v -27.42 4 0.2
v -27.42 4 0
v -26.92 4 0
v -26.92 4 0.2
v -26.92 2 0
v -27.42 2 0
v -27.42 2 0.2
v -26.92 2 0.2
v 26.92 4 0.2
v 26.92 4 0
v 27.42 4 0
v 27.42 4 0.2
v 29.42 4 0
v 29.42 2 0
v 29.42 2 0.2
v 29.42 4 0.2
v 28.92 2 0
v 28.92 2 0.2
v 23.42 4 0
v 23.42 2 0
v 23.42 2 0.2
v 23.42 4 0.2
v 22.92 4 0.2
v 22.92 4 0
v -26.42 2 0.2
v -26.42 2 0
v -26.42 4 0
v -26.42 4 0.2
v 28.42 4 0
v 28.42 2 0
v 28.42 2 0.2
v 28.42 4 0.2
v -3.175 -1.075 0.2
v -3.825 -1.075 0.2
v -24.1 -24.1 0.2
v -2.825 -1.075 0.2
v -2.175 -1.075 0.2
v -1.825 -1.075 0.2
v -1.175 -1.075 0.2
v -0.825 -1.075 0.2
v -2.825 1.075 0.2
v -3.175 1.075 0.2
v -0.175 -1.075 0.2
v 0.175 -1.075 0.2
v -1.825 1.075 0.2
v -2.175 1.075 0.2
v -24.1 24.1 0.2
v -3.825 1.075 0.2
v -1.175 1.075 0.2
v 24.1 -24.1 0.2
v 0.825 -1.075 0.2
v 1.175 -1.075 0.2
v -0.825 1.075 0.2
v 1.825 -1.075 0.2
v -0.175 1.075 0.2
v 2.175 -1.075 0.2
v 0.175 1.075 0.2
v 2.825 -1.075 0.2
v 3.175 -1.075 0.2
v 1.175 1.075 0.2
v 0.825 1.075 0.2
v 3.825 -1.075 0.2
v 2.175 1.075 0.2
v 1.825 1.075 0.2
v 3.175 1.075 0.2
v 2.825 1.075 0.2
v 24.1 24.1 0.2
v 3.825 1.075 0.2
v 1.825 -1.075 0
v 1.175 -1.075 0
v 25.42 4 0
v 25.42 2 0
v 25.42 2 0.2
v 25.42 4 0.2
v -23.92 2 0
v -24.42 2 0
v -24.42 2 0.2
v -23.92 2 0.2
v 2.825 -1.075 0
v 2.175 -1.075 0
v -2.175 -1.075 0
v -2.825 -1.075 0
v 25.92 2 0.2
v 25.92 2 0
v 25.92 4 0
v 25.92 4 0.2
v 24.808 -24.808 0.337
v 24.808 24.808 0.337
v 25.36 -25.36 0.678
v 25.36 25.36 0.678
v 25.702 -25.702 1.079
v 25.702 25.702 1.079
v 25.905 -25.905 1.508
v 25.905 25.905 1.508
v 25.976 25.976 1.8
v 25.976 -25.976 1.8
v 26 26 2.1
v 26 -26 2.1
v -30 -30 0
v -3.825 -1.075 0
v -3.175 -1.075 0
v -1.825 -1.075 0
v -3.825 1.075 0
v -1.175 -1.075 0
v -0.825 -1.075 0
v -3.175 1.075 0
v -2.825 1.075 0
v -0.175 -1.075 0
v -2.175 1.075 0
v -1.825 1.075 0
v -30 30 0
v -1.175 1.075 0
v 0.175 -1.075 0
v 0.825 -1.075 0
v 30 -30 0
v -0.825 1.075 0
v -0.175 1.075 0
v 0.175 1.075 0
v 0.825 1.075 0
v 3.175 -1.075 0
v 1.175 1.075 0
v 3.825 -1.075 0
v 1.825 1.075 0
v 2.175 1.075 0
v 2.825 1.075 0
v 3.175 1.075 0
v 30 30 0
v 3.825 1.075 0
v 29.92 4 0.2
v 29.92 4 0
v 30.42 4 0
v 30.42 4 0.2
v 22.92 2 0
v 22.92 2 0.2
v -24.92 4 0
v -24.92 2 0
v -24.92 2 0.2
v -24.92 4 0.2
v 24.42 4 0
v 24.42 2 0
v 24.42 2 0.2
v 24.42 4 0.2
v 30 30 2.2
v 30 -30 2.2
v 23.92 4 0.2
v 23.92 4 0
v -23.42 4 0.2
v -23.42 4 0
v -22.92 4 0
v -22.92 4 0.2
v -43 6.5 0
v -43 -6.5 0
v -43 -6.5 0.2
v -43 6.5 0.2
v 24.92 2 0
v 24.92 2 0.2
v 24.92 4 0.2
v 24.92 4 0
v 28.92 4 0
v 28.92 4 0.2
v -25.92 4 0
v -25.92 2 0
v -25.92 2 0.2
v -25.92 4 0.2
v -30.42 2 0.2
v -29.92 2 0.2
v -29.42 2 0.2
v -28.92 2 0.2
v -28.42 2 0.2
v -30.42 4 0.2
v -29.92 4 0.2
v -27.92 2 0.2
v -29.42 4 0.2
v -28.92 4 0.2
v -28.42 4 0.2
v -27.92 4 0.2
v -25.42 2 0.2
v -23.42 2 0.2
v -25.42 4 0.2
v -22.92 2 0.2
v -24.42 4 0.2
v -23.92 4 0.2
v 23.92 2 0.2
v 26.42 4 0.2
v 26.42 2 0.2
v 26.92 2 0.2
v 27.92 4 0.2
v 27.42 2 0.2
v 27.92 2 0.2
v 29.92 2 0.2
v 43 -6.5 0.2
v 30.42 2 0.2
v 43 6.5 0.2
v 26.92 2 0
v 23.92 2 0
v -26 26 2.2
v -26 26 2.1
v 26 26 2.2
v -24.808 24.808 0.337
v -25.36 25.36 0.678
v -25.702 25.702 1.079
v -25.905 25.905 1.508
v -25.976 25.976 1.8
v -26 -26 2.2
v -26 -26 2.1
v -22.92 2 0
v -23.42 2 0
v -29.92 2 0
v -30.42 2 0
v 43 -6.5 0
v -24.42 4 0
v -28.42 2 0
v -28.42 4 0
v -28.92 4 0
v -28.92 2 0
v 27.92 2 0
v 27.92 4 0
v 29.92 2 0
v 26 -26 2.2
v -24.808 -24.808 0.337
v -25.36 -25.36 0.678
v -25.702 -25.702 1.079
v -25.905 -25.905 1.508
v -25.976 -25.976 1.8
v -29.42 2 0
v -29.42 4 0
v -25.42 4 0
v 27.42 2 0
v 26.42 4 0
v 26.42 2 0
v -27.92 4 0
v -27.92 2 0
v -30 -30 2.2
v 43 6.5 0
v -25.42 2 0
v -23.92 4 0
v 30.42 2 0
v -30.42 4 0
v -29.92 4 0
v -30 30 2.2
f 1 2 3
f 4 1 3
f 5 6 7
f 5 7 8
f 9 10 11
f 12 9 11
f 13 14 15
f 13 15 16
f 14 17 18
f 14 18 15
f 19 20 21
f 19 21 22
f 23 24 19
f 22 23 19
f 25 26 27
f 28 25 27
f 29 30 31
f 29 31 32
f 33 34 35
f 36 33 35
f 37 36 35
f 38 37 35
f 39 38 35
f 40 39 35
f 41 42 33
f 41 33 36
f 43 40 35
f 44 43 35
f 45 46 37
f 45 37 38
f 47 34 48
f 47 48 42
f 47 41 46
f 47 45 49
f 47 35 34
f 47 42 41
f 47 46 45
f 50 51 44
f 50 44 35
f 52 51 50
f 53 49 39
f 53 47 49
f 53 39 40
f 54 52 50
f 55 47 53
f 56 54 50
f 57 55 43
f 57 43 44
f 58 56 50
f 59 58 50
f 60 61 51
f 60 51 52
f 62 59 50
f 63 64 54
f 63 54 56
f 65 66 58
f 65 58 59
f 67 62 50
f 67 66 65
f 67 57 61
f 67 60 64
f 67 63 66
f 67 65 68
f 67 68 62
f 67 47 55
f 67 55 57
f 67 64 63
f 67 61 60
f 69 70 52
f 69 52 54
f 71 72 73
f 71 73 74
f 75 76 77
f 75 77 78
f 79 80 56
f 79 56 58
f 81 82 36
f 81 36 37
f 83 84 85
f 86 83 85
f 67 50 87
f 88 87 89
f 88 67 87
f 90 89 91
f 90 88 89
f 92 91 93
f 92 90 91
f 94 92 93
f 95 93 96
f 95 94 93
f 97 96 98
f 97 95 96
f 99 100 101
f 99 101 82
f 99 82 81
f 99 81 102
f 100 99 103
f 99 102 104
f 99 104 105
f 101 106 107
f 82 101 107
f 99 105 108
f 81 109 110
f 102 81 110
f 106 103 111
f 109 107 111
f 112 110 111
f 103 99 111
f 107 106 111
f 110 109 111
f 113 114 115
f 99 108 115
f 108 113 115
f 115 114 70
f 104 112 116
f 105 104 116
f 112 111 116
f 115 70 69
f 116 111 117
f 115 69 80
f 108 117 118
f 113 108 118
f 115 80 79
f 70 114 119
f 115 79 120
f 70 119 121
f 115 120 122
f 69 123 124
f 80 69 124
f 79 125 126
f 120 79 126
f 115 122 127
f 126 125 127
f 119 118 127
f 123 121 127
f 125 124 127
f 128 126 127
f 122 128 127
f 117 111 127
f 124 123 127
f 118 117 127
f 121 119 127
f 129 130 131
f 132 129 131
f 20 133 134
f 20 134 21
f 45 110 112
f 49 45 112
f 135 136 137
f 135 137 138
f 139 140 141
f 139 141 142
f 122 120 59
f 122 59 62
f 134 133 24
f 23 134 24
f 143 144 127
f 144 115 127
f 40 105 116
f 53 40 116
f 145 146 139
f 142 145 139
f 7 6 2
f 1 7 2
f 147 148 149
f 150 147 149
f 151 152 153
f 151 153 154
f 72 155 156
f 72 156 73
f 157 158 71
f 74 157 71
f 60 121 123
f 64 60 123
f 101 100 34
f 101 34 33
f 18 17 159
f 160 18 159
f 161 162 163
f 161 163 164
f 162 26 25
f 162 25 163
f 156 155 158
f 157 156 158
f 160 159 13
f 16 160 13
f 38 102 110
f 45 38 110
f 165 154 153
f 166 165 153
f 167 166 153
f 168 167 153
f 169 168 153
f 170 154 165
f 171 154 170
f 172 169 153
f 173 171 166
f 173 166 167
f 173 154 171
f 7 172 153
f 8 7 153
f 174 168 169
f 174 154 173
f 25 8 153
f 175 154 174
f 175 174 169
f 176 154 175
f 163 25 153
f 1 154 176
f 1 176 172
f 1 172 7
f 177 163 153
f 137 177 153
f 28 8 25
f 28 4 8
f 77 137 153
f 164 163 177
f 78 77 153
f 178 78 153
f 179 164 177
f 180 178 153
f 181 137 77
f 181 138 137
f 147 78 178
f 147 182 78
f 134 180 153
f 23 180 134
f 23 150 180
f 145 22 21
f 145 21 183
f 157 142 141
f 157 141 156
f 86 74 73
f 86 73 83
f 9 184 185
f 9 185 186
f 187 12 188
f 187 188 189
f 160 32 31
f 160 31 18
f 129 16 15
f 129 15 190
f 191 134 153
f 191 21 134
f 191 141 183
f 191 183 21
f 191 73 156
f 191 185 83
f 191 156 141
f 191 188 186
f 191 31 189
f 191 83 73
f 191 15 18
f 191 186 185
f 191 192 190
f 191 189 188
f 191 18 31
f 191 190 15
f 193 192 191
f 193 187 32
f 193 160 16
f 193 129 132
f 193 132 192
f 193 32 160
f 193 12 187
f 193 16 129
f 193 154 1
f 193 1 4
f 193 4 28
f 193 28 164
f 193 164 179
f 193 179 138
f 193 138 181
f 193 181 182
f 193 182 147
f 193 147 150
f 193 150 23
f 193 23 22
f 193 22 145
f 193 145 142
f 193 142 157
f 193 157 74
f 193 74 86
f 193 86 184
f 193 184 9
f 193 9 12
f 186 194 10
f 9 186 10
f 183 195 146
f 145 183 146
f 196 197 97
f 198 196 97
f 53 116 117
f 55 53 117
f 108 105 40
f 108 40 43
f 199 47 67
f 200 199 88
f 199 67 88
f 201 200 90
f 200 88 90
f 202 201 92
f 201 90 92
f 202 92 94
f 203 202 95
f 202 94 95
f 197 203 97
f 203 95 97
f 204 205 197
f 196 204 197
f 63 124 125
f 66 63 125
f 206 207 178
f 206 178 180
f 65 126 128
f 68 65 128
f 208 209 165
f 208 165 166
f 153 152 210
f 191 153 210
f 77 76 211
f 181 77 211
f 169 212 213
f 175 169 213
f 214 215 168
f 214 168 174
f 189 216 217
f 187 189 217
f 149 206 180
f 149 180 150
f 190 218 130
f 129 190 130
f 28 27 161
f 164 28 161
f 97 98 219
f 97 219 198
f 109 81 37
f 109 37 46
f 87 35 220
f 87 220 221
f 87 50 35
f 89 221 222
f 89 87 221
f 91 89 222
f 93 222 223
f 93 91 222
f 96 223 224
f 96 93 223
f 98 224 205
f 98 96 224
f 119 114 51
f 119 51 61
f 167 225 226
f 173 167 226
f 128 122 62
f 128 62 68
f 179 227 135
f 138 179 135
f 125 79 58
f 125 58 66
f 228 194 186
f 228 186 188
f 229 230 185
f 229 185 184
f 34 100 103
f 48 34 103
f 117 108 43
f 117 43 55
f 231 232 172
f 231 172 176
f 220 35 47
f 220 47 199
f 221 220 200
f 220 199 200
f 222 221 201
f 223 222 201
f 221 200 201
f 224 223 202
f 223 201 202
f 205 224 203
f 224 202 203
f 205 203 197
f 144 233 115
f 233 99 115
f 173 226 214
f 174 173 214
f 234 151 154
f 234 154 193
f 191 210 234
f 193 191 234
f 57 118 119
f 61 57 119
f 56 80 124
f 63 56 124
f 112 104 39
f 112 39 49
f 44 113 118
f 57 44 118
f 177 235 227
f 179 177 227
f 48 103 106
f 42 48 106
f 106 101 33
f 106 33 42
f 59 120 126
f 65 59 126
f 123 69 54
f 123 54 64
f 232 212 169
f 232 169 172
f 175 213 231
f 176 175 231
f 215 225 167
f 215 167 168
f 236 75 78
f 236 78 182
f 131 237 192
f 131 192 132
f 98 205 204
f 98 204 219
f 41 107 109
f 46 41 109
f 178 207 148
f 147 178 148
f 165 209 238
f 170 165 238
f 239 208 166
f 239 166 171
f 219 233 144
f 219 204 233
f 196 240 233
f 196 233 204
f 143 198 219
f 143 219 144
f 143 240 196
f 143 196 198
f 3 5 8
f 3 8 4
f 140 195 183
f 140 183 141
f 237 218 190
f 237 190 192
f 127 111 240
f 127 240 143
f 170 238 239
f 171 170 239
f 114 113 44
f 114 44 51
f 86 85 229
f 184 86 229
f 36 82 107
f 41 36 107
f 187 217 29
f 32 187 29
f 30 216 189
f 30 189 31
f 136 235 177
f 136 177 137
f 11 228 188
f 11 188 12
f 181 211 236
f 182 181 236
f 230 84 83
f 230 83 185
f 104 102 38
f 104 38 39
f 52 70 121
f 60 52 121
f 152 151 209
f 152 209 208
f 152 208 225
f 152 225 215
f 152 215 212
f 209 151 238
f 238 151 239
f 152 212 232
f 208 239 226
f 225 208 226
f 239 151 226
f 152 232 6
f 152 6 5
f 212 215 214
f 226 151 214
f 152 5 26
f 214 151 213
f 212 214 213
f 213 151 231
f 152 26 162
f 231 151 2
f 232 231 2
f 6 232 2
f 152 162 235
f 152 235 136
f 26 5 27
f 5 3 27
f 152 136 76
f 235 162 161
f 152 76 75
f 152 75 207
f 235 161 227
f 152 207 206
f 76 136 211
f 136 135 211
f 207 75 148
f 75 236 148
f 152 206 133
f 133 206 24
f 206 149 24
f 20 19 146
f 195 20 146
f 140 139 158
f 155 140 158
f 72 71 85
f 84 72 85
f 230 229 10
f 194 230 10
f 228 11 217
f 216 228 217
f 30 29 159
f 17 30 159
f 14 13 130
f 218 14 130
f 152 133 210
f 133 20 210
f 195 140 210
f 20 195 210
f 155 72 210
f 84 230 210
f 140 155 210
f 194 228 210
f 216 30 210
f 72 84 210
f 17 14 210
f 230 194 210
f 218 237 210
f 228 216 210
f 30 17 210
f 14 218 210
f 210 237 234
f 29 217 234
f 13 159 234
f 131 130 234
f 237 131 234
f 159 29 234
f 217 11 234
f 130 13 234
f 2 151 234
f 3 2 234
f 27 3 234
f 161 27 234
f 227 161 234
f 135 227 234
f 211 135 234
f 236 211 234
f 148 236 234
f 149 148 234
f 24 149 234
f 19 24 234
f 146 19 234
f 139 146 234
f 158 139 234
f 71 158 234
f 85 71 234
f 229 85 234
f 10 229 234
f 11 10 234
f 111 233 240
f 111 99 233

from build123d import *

# Parameters (mm, degrees)
SKETCH_W      = 86
SKETCH_H      = 13
SKETCH_W_2    = 0.5
SKETCH_H_2    = 2
PAD_DEPTH     = 0.2
SKETCH001_W   = 60
SKETCH001_H   = 60
SKETCH001_W_2 = 0.65
SKETCH001_H_2 = 2.15
PAD001_DEPTH  = 0.2
SKETCH002_W   = 60
SKETCH002_H   = 60
SKETCH002_W_2 = 52
SKETCH002_H_2 = 52
PAD002_DEPTH  = 2
FILLET_R      = 1.9


with BuildPart() as body:
    # Sketch → Pad (new body)
    with BuildSketch(Plane.XY):
        Rectangle(SKETCH_W, SKETCH_H)
        with Locations((-30.17, 3)):
            Rectangle(SKETCH_W_2, SKETCH_H_2, mode=Mode.SUBTRACT)
        with Locations((-29.17, 3)):
            Rectangle(SKETCH_W_2, SKETCH_H_2, mode=Mode.SUBTRACT)
        with Locations((-28.17, 3)):
            Rectangle(SKETCH_W_2, SKETCH_H_2, mode=Mode.SUBTRACT)
        with Locations((-27.17, 3)):
            Rectangle(SKETCH_W_2, SKETCH_H_2, mode=Mode.SUBTRACT)
        with Locations((-26.17, 3)):
            Rectangle(SKETCH_W_2, SKETCH_H_2, mode=Mode.SUBTRACT)
        with Locations((-25.17, 3)):
            Rectangle(SKETCH_W_2, SKETCH_H_2, mode=Mode.SUBTRACT)
        with Locations((-24.17, 3)):
            Rectangle(SKETCH_W_2, SKETCH_H_2, mode=Mode.SUBTRACT)
        with Locations((-23.17, 3)):
            Rectangle(SKETCH_W_2, SKETCH_H_2, mode=Mode.SUBTRACT)
        with Locations((23.17, 3)):
            Rectangle(SKETCH_W_2, SKETCH_H_2, mode=Mode.SUBTRACT)
        with Locations((24.17, 3)):
            Rectangle(SKETCH_W_2, SKETCH_H_2, mode=Mode.SUBTRACT)
        with Locations((25.17, 3)):
            Rectangle(SKETCH_W_2, SKETCH_H_2, mode=Mode.SUBTRACT)
        with Locations((26.17, 3)):
            Rectangle(SKETCH_W_2, SKETCH_H_2, mode=Mode.SUBTRACT)
        with Locations((27.17, 3)):
            Rectangle(SKETCH_W_2, SKETCH_H_2, mode=Mode.SUBTRACT)
        with Locations((28.17, 3)):
            Rectangle(SKETCH_W_2, SKETCH_H_2, mode=Mode.SUBTRACT)
        with Locations((29.17, 3)):
            Rectangle(SKETCH_W_2, SKETCH_H_2, mode=Mode.SUBTRACT)
        with Locations((30.17, 3)):
            Rectangle(SKETCH_W_2, SKETCH_H_2, mode=Mode.SUBTRACT)
    extrude(amount=PAD_DEPTH)


with BuildPart() as body001:
    # Sketch001 → Pad001 (new body)
    with BuildSketch(Plane.XY):
        Rectangle(SKETCH001_W, SKETCH001_H)
        with Locations((-3.5, 0)):
            Rectangle(SKETCH001_W_2, SKETCH001_H_2, mode=Mode.SUBTRACT)
        with Locations((-2.5, 0)):
            Rectangle(SKETCH001_W_2, SKETCH001_H_2, mode=Mode.SUBTRACT)
        with Locations((-1.5, 0)):
            Rectangle(SKETCH001_W_2, SKETCH001_H_2, mode=Mode.SUBTRACT)
        with Locations((-0.5, 0)):
            Rectangle(SKETCH001_W_2, SKETCH001_H_2, mode=Mode.SUBTRACT)
        with Locations((0.5, 0)):
            Rectangle(SKETCH001_W_2, SKETCH001_H_2, mode=Mode.SUBTRACT)
        with Locations((1.5, 0)):
            Rectangle(SKETCH001_W_2, SKETCH001_H_2, mode=Mode.SUBTRACT)
        with Locations((2.5, 0)):
            Rectangle(SKETCH001_W_2, SKETCH001_H_2, mode=Mode.SUBTRACT)
        with Locations((3.5, 0)):
            Rectangle(SKETCH001_W_2, SKETCH001_H_2, mode=Mode.SUBTRACT)
    extrude(amount=PAD001_DEPTH)

    # Sketch002 (on Face38 of Pad001) → Pad002 (join)
    with BuildSketch(Plane.XY.offset(0.2)):
        Rectangle(SKETCH002_W, SKETCH002_H)
        Rectangle(SKETCH002_W_2, SKETCH002_H_2, mode=Mode.SUBTRACT)
    extrude(amount=PAD002_DEPTH)

    # Fillet
    fillet_edges = [body001.edges().sort_by_distance(p)[0] for p in [
        (0, 26, 0.2),
        (-26, 0, 0.2),
        (26, 0, 0.2),
        (0, -26, 0.2),
    ]]
    fillet(fillet_edges, radius=FILLET_R)


solid = Compound([body.part, body001.part])
